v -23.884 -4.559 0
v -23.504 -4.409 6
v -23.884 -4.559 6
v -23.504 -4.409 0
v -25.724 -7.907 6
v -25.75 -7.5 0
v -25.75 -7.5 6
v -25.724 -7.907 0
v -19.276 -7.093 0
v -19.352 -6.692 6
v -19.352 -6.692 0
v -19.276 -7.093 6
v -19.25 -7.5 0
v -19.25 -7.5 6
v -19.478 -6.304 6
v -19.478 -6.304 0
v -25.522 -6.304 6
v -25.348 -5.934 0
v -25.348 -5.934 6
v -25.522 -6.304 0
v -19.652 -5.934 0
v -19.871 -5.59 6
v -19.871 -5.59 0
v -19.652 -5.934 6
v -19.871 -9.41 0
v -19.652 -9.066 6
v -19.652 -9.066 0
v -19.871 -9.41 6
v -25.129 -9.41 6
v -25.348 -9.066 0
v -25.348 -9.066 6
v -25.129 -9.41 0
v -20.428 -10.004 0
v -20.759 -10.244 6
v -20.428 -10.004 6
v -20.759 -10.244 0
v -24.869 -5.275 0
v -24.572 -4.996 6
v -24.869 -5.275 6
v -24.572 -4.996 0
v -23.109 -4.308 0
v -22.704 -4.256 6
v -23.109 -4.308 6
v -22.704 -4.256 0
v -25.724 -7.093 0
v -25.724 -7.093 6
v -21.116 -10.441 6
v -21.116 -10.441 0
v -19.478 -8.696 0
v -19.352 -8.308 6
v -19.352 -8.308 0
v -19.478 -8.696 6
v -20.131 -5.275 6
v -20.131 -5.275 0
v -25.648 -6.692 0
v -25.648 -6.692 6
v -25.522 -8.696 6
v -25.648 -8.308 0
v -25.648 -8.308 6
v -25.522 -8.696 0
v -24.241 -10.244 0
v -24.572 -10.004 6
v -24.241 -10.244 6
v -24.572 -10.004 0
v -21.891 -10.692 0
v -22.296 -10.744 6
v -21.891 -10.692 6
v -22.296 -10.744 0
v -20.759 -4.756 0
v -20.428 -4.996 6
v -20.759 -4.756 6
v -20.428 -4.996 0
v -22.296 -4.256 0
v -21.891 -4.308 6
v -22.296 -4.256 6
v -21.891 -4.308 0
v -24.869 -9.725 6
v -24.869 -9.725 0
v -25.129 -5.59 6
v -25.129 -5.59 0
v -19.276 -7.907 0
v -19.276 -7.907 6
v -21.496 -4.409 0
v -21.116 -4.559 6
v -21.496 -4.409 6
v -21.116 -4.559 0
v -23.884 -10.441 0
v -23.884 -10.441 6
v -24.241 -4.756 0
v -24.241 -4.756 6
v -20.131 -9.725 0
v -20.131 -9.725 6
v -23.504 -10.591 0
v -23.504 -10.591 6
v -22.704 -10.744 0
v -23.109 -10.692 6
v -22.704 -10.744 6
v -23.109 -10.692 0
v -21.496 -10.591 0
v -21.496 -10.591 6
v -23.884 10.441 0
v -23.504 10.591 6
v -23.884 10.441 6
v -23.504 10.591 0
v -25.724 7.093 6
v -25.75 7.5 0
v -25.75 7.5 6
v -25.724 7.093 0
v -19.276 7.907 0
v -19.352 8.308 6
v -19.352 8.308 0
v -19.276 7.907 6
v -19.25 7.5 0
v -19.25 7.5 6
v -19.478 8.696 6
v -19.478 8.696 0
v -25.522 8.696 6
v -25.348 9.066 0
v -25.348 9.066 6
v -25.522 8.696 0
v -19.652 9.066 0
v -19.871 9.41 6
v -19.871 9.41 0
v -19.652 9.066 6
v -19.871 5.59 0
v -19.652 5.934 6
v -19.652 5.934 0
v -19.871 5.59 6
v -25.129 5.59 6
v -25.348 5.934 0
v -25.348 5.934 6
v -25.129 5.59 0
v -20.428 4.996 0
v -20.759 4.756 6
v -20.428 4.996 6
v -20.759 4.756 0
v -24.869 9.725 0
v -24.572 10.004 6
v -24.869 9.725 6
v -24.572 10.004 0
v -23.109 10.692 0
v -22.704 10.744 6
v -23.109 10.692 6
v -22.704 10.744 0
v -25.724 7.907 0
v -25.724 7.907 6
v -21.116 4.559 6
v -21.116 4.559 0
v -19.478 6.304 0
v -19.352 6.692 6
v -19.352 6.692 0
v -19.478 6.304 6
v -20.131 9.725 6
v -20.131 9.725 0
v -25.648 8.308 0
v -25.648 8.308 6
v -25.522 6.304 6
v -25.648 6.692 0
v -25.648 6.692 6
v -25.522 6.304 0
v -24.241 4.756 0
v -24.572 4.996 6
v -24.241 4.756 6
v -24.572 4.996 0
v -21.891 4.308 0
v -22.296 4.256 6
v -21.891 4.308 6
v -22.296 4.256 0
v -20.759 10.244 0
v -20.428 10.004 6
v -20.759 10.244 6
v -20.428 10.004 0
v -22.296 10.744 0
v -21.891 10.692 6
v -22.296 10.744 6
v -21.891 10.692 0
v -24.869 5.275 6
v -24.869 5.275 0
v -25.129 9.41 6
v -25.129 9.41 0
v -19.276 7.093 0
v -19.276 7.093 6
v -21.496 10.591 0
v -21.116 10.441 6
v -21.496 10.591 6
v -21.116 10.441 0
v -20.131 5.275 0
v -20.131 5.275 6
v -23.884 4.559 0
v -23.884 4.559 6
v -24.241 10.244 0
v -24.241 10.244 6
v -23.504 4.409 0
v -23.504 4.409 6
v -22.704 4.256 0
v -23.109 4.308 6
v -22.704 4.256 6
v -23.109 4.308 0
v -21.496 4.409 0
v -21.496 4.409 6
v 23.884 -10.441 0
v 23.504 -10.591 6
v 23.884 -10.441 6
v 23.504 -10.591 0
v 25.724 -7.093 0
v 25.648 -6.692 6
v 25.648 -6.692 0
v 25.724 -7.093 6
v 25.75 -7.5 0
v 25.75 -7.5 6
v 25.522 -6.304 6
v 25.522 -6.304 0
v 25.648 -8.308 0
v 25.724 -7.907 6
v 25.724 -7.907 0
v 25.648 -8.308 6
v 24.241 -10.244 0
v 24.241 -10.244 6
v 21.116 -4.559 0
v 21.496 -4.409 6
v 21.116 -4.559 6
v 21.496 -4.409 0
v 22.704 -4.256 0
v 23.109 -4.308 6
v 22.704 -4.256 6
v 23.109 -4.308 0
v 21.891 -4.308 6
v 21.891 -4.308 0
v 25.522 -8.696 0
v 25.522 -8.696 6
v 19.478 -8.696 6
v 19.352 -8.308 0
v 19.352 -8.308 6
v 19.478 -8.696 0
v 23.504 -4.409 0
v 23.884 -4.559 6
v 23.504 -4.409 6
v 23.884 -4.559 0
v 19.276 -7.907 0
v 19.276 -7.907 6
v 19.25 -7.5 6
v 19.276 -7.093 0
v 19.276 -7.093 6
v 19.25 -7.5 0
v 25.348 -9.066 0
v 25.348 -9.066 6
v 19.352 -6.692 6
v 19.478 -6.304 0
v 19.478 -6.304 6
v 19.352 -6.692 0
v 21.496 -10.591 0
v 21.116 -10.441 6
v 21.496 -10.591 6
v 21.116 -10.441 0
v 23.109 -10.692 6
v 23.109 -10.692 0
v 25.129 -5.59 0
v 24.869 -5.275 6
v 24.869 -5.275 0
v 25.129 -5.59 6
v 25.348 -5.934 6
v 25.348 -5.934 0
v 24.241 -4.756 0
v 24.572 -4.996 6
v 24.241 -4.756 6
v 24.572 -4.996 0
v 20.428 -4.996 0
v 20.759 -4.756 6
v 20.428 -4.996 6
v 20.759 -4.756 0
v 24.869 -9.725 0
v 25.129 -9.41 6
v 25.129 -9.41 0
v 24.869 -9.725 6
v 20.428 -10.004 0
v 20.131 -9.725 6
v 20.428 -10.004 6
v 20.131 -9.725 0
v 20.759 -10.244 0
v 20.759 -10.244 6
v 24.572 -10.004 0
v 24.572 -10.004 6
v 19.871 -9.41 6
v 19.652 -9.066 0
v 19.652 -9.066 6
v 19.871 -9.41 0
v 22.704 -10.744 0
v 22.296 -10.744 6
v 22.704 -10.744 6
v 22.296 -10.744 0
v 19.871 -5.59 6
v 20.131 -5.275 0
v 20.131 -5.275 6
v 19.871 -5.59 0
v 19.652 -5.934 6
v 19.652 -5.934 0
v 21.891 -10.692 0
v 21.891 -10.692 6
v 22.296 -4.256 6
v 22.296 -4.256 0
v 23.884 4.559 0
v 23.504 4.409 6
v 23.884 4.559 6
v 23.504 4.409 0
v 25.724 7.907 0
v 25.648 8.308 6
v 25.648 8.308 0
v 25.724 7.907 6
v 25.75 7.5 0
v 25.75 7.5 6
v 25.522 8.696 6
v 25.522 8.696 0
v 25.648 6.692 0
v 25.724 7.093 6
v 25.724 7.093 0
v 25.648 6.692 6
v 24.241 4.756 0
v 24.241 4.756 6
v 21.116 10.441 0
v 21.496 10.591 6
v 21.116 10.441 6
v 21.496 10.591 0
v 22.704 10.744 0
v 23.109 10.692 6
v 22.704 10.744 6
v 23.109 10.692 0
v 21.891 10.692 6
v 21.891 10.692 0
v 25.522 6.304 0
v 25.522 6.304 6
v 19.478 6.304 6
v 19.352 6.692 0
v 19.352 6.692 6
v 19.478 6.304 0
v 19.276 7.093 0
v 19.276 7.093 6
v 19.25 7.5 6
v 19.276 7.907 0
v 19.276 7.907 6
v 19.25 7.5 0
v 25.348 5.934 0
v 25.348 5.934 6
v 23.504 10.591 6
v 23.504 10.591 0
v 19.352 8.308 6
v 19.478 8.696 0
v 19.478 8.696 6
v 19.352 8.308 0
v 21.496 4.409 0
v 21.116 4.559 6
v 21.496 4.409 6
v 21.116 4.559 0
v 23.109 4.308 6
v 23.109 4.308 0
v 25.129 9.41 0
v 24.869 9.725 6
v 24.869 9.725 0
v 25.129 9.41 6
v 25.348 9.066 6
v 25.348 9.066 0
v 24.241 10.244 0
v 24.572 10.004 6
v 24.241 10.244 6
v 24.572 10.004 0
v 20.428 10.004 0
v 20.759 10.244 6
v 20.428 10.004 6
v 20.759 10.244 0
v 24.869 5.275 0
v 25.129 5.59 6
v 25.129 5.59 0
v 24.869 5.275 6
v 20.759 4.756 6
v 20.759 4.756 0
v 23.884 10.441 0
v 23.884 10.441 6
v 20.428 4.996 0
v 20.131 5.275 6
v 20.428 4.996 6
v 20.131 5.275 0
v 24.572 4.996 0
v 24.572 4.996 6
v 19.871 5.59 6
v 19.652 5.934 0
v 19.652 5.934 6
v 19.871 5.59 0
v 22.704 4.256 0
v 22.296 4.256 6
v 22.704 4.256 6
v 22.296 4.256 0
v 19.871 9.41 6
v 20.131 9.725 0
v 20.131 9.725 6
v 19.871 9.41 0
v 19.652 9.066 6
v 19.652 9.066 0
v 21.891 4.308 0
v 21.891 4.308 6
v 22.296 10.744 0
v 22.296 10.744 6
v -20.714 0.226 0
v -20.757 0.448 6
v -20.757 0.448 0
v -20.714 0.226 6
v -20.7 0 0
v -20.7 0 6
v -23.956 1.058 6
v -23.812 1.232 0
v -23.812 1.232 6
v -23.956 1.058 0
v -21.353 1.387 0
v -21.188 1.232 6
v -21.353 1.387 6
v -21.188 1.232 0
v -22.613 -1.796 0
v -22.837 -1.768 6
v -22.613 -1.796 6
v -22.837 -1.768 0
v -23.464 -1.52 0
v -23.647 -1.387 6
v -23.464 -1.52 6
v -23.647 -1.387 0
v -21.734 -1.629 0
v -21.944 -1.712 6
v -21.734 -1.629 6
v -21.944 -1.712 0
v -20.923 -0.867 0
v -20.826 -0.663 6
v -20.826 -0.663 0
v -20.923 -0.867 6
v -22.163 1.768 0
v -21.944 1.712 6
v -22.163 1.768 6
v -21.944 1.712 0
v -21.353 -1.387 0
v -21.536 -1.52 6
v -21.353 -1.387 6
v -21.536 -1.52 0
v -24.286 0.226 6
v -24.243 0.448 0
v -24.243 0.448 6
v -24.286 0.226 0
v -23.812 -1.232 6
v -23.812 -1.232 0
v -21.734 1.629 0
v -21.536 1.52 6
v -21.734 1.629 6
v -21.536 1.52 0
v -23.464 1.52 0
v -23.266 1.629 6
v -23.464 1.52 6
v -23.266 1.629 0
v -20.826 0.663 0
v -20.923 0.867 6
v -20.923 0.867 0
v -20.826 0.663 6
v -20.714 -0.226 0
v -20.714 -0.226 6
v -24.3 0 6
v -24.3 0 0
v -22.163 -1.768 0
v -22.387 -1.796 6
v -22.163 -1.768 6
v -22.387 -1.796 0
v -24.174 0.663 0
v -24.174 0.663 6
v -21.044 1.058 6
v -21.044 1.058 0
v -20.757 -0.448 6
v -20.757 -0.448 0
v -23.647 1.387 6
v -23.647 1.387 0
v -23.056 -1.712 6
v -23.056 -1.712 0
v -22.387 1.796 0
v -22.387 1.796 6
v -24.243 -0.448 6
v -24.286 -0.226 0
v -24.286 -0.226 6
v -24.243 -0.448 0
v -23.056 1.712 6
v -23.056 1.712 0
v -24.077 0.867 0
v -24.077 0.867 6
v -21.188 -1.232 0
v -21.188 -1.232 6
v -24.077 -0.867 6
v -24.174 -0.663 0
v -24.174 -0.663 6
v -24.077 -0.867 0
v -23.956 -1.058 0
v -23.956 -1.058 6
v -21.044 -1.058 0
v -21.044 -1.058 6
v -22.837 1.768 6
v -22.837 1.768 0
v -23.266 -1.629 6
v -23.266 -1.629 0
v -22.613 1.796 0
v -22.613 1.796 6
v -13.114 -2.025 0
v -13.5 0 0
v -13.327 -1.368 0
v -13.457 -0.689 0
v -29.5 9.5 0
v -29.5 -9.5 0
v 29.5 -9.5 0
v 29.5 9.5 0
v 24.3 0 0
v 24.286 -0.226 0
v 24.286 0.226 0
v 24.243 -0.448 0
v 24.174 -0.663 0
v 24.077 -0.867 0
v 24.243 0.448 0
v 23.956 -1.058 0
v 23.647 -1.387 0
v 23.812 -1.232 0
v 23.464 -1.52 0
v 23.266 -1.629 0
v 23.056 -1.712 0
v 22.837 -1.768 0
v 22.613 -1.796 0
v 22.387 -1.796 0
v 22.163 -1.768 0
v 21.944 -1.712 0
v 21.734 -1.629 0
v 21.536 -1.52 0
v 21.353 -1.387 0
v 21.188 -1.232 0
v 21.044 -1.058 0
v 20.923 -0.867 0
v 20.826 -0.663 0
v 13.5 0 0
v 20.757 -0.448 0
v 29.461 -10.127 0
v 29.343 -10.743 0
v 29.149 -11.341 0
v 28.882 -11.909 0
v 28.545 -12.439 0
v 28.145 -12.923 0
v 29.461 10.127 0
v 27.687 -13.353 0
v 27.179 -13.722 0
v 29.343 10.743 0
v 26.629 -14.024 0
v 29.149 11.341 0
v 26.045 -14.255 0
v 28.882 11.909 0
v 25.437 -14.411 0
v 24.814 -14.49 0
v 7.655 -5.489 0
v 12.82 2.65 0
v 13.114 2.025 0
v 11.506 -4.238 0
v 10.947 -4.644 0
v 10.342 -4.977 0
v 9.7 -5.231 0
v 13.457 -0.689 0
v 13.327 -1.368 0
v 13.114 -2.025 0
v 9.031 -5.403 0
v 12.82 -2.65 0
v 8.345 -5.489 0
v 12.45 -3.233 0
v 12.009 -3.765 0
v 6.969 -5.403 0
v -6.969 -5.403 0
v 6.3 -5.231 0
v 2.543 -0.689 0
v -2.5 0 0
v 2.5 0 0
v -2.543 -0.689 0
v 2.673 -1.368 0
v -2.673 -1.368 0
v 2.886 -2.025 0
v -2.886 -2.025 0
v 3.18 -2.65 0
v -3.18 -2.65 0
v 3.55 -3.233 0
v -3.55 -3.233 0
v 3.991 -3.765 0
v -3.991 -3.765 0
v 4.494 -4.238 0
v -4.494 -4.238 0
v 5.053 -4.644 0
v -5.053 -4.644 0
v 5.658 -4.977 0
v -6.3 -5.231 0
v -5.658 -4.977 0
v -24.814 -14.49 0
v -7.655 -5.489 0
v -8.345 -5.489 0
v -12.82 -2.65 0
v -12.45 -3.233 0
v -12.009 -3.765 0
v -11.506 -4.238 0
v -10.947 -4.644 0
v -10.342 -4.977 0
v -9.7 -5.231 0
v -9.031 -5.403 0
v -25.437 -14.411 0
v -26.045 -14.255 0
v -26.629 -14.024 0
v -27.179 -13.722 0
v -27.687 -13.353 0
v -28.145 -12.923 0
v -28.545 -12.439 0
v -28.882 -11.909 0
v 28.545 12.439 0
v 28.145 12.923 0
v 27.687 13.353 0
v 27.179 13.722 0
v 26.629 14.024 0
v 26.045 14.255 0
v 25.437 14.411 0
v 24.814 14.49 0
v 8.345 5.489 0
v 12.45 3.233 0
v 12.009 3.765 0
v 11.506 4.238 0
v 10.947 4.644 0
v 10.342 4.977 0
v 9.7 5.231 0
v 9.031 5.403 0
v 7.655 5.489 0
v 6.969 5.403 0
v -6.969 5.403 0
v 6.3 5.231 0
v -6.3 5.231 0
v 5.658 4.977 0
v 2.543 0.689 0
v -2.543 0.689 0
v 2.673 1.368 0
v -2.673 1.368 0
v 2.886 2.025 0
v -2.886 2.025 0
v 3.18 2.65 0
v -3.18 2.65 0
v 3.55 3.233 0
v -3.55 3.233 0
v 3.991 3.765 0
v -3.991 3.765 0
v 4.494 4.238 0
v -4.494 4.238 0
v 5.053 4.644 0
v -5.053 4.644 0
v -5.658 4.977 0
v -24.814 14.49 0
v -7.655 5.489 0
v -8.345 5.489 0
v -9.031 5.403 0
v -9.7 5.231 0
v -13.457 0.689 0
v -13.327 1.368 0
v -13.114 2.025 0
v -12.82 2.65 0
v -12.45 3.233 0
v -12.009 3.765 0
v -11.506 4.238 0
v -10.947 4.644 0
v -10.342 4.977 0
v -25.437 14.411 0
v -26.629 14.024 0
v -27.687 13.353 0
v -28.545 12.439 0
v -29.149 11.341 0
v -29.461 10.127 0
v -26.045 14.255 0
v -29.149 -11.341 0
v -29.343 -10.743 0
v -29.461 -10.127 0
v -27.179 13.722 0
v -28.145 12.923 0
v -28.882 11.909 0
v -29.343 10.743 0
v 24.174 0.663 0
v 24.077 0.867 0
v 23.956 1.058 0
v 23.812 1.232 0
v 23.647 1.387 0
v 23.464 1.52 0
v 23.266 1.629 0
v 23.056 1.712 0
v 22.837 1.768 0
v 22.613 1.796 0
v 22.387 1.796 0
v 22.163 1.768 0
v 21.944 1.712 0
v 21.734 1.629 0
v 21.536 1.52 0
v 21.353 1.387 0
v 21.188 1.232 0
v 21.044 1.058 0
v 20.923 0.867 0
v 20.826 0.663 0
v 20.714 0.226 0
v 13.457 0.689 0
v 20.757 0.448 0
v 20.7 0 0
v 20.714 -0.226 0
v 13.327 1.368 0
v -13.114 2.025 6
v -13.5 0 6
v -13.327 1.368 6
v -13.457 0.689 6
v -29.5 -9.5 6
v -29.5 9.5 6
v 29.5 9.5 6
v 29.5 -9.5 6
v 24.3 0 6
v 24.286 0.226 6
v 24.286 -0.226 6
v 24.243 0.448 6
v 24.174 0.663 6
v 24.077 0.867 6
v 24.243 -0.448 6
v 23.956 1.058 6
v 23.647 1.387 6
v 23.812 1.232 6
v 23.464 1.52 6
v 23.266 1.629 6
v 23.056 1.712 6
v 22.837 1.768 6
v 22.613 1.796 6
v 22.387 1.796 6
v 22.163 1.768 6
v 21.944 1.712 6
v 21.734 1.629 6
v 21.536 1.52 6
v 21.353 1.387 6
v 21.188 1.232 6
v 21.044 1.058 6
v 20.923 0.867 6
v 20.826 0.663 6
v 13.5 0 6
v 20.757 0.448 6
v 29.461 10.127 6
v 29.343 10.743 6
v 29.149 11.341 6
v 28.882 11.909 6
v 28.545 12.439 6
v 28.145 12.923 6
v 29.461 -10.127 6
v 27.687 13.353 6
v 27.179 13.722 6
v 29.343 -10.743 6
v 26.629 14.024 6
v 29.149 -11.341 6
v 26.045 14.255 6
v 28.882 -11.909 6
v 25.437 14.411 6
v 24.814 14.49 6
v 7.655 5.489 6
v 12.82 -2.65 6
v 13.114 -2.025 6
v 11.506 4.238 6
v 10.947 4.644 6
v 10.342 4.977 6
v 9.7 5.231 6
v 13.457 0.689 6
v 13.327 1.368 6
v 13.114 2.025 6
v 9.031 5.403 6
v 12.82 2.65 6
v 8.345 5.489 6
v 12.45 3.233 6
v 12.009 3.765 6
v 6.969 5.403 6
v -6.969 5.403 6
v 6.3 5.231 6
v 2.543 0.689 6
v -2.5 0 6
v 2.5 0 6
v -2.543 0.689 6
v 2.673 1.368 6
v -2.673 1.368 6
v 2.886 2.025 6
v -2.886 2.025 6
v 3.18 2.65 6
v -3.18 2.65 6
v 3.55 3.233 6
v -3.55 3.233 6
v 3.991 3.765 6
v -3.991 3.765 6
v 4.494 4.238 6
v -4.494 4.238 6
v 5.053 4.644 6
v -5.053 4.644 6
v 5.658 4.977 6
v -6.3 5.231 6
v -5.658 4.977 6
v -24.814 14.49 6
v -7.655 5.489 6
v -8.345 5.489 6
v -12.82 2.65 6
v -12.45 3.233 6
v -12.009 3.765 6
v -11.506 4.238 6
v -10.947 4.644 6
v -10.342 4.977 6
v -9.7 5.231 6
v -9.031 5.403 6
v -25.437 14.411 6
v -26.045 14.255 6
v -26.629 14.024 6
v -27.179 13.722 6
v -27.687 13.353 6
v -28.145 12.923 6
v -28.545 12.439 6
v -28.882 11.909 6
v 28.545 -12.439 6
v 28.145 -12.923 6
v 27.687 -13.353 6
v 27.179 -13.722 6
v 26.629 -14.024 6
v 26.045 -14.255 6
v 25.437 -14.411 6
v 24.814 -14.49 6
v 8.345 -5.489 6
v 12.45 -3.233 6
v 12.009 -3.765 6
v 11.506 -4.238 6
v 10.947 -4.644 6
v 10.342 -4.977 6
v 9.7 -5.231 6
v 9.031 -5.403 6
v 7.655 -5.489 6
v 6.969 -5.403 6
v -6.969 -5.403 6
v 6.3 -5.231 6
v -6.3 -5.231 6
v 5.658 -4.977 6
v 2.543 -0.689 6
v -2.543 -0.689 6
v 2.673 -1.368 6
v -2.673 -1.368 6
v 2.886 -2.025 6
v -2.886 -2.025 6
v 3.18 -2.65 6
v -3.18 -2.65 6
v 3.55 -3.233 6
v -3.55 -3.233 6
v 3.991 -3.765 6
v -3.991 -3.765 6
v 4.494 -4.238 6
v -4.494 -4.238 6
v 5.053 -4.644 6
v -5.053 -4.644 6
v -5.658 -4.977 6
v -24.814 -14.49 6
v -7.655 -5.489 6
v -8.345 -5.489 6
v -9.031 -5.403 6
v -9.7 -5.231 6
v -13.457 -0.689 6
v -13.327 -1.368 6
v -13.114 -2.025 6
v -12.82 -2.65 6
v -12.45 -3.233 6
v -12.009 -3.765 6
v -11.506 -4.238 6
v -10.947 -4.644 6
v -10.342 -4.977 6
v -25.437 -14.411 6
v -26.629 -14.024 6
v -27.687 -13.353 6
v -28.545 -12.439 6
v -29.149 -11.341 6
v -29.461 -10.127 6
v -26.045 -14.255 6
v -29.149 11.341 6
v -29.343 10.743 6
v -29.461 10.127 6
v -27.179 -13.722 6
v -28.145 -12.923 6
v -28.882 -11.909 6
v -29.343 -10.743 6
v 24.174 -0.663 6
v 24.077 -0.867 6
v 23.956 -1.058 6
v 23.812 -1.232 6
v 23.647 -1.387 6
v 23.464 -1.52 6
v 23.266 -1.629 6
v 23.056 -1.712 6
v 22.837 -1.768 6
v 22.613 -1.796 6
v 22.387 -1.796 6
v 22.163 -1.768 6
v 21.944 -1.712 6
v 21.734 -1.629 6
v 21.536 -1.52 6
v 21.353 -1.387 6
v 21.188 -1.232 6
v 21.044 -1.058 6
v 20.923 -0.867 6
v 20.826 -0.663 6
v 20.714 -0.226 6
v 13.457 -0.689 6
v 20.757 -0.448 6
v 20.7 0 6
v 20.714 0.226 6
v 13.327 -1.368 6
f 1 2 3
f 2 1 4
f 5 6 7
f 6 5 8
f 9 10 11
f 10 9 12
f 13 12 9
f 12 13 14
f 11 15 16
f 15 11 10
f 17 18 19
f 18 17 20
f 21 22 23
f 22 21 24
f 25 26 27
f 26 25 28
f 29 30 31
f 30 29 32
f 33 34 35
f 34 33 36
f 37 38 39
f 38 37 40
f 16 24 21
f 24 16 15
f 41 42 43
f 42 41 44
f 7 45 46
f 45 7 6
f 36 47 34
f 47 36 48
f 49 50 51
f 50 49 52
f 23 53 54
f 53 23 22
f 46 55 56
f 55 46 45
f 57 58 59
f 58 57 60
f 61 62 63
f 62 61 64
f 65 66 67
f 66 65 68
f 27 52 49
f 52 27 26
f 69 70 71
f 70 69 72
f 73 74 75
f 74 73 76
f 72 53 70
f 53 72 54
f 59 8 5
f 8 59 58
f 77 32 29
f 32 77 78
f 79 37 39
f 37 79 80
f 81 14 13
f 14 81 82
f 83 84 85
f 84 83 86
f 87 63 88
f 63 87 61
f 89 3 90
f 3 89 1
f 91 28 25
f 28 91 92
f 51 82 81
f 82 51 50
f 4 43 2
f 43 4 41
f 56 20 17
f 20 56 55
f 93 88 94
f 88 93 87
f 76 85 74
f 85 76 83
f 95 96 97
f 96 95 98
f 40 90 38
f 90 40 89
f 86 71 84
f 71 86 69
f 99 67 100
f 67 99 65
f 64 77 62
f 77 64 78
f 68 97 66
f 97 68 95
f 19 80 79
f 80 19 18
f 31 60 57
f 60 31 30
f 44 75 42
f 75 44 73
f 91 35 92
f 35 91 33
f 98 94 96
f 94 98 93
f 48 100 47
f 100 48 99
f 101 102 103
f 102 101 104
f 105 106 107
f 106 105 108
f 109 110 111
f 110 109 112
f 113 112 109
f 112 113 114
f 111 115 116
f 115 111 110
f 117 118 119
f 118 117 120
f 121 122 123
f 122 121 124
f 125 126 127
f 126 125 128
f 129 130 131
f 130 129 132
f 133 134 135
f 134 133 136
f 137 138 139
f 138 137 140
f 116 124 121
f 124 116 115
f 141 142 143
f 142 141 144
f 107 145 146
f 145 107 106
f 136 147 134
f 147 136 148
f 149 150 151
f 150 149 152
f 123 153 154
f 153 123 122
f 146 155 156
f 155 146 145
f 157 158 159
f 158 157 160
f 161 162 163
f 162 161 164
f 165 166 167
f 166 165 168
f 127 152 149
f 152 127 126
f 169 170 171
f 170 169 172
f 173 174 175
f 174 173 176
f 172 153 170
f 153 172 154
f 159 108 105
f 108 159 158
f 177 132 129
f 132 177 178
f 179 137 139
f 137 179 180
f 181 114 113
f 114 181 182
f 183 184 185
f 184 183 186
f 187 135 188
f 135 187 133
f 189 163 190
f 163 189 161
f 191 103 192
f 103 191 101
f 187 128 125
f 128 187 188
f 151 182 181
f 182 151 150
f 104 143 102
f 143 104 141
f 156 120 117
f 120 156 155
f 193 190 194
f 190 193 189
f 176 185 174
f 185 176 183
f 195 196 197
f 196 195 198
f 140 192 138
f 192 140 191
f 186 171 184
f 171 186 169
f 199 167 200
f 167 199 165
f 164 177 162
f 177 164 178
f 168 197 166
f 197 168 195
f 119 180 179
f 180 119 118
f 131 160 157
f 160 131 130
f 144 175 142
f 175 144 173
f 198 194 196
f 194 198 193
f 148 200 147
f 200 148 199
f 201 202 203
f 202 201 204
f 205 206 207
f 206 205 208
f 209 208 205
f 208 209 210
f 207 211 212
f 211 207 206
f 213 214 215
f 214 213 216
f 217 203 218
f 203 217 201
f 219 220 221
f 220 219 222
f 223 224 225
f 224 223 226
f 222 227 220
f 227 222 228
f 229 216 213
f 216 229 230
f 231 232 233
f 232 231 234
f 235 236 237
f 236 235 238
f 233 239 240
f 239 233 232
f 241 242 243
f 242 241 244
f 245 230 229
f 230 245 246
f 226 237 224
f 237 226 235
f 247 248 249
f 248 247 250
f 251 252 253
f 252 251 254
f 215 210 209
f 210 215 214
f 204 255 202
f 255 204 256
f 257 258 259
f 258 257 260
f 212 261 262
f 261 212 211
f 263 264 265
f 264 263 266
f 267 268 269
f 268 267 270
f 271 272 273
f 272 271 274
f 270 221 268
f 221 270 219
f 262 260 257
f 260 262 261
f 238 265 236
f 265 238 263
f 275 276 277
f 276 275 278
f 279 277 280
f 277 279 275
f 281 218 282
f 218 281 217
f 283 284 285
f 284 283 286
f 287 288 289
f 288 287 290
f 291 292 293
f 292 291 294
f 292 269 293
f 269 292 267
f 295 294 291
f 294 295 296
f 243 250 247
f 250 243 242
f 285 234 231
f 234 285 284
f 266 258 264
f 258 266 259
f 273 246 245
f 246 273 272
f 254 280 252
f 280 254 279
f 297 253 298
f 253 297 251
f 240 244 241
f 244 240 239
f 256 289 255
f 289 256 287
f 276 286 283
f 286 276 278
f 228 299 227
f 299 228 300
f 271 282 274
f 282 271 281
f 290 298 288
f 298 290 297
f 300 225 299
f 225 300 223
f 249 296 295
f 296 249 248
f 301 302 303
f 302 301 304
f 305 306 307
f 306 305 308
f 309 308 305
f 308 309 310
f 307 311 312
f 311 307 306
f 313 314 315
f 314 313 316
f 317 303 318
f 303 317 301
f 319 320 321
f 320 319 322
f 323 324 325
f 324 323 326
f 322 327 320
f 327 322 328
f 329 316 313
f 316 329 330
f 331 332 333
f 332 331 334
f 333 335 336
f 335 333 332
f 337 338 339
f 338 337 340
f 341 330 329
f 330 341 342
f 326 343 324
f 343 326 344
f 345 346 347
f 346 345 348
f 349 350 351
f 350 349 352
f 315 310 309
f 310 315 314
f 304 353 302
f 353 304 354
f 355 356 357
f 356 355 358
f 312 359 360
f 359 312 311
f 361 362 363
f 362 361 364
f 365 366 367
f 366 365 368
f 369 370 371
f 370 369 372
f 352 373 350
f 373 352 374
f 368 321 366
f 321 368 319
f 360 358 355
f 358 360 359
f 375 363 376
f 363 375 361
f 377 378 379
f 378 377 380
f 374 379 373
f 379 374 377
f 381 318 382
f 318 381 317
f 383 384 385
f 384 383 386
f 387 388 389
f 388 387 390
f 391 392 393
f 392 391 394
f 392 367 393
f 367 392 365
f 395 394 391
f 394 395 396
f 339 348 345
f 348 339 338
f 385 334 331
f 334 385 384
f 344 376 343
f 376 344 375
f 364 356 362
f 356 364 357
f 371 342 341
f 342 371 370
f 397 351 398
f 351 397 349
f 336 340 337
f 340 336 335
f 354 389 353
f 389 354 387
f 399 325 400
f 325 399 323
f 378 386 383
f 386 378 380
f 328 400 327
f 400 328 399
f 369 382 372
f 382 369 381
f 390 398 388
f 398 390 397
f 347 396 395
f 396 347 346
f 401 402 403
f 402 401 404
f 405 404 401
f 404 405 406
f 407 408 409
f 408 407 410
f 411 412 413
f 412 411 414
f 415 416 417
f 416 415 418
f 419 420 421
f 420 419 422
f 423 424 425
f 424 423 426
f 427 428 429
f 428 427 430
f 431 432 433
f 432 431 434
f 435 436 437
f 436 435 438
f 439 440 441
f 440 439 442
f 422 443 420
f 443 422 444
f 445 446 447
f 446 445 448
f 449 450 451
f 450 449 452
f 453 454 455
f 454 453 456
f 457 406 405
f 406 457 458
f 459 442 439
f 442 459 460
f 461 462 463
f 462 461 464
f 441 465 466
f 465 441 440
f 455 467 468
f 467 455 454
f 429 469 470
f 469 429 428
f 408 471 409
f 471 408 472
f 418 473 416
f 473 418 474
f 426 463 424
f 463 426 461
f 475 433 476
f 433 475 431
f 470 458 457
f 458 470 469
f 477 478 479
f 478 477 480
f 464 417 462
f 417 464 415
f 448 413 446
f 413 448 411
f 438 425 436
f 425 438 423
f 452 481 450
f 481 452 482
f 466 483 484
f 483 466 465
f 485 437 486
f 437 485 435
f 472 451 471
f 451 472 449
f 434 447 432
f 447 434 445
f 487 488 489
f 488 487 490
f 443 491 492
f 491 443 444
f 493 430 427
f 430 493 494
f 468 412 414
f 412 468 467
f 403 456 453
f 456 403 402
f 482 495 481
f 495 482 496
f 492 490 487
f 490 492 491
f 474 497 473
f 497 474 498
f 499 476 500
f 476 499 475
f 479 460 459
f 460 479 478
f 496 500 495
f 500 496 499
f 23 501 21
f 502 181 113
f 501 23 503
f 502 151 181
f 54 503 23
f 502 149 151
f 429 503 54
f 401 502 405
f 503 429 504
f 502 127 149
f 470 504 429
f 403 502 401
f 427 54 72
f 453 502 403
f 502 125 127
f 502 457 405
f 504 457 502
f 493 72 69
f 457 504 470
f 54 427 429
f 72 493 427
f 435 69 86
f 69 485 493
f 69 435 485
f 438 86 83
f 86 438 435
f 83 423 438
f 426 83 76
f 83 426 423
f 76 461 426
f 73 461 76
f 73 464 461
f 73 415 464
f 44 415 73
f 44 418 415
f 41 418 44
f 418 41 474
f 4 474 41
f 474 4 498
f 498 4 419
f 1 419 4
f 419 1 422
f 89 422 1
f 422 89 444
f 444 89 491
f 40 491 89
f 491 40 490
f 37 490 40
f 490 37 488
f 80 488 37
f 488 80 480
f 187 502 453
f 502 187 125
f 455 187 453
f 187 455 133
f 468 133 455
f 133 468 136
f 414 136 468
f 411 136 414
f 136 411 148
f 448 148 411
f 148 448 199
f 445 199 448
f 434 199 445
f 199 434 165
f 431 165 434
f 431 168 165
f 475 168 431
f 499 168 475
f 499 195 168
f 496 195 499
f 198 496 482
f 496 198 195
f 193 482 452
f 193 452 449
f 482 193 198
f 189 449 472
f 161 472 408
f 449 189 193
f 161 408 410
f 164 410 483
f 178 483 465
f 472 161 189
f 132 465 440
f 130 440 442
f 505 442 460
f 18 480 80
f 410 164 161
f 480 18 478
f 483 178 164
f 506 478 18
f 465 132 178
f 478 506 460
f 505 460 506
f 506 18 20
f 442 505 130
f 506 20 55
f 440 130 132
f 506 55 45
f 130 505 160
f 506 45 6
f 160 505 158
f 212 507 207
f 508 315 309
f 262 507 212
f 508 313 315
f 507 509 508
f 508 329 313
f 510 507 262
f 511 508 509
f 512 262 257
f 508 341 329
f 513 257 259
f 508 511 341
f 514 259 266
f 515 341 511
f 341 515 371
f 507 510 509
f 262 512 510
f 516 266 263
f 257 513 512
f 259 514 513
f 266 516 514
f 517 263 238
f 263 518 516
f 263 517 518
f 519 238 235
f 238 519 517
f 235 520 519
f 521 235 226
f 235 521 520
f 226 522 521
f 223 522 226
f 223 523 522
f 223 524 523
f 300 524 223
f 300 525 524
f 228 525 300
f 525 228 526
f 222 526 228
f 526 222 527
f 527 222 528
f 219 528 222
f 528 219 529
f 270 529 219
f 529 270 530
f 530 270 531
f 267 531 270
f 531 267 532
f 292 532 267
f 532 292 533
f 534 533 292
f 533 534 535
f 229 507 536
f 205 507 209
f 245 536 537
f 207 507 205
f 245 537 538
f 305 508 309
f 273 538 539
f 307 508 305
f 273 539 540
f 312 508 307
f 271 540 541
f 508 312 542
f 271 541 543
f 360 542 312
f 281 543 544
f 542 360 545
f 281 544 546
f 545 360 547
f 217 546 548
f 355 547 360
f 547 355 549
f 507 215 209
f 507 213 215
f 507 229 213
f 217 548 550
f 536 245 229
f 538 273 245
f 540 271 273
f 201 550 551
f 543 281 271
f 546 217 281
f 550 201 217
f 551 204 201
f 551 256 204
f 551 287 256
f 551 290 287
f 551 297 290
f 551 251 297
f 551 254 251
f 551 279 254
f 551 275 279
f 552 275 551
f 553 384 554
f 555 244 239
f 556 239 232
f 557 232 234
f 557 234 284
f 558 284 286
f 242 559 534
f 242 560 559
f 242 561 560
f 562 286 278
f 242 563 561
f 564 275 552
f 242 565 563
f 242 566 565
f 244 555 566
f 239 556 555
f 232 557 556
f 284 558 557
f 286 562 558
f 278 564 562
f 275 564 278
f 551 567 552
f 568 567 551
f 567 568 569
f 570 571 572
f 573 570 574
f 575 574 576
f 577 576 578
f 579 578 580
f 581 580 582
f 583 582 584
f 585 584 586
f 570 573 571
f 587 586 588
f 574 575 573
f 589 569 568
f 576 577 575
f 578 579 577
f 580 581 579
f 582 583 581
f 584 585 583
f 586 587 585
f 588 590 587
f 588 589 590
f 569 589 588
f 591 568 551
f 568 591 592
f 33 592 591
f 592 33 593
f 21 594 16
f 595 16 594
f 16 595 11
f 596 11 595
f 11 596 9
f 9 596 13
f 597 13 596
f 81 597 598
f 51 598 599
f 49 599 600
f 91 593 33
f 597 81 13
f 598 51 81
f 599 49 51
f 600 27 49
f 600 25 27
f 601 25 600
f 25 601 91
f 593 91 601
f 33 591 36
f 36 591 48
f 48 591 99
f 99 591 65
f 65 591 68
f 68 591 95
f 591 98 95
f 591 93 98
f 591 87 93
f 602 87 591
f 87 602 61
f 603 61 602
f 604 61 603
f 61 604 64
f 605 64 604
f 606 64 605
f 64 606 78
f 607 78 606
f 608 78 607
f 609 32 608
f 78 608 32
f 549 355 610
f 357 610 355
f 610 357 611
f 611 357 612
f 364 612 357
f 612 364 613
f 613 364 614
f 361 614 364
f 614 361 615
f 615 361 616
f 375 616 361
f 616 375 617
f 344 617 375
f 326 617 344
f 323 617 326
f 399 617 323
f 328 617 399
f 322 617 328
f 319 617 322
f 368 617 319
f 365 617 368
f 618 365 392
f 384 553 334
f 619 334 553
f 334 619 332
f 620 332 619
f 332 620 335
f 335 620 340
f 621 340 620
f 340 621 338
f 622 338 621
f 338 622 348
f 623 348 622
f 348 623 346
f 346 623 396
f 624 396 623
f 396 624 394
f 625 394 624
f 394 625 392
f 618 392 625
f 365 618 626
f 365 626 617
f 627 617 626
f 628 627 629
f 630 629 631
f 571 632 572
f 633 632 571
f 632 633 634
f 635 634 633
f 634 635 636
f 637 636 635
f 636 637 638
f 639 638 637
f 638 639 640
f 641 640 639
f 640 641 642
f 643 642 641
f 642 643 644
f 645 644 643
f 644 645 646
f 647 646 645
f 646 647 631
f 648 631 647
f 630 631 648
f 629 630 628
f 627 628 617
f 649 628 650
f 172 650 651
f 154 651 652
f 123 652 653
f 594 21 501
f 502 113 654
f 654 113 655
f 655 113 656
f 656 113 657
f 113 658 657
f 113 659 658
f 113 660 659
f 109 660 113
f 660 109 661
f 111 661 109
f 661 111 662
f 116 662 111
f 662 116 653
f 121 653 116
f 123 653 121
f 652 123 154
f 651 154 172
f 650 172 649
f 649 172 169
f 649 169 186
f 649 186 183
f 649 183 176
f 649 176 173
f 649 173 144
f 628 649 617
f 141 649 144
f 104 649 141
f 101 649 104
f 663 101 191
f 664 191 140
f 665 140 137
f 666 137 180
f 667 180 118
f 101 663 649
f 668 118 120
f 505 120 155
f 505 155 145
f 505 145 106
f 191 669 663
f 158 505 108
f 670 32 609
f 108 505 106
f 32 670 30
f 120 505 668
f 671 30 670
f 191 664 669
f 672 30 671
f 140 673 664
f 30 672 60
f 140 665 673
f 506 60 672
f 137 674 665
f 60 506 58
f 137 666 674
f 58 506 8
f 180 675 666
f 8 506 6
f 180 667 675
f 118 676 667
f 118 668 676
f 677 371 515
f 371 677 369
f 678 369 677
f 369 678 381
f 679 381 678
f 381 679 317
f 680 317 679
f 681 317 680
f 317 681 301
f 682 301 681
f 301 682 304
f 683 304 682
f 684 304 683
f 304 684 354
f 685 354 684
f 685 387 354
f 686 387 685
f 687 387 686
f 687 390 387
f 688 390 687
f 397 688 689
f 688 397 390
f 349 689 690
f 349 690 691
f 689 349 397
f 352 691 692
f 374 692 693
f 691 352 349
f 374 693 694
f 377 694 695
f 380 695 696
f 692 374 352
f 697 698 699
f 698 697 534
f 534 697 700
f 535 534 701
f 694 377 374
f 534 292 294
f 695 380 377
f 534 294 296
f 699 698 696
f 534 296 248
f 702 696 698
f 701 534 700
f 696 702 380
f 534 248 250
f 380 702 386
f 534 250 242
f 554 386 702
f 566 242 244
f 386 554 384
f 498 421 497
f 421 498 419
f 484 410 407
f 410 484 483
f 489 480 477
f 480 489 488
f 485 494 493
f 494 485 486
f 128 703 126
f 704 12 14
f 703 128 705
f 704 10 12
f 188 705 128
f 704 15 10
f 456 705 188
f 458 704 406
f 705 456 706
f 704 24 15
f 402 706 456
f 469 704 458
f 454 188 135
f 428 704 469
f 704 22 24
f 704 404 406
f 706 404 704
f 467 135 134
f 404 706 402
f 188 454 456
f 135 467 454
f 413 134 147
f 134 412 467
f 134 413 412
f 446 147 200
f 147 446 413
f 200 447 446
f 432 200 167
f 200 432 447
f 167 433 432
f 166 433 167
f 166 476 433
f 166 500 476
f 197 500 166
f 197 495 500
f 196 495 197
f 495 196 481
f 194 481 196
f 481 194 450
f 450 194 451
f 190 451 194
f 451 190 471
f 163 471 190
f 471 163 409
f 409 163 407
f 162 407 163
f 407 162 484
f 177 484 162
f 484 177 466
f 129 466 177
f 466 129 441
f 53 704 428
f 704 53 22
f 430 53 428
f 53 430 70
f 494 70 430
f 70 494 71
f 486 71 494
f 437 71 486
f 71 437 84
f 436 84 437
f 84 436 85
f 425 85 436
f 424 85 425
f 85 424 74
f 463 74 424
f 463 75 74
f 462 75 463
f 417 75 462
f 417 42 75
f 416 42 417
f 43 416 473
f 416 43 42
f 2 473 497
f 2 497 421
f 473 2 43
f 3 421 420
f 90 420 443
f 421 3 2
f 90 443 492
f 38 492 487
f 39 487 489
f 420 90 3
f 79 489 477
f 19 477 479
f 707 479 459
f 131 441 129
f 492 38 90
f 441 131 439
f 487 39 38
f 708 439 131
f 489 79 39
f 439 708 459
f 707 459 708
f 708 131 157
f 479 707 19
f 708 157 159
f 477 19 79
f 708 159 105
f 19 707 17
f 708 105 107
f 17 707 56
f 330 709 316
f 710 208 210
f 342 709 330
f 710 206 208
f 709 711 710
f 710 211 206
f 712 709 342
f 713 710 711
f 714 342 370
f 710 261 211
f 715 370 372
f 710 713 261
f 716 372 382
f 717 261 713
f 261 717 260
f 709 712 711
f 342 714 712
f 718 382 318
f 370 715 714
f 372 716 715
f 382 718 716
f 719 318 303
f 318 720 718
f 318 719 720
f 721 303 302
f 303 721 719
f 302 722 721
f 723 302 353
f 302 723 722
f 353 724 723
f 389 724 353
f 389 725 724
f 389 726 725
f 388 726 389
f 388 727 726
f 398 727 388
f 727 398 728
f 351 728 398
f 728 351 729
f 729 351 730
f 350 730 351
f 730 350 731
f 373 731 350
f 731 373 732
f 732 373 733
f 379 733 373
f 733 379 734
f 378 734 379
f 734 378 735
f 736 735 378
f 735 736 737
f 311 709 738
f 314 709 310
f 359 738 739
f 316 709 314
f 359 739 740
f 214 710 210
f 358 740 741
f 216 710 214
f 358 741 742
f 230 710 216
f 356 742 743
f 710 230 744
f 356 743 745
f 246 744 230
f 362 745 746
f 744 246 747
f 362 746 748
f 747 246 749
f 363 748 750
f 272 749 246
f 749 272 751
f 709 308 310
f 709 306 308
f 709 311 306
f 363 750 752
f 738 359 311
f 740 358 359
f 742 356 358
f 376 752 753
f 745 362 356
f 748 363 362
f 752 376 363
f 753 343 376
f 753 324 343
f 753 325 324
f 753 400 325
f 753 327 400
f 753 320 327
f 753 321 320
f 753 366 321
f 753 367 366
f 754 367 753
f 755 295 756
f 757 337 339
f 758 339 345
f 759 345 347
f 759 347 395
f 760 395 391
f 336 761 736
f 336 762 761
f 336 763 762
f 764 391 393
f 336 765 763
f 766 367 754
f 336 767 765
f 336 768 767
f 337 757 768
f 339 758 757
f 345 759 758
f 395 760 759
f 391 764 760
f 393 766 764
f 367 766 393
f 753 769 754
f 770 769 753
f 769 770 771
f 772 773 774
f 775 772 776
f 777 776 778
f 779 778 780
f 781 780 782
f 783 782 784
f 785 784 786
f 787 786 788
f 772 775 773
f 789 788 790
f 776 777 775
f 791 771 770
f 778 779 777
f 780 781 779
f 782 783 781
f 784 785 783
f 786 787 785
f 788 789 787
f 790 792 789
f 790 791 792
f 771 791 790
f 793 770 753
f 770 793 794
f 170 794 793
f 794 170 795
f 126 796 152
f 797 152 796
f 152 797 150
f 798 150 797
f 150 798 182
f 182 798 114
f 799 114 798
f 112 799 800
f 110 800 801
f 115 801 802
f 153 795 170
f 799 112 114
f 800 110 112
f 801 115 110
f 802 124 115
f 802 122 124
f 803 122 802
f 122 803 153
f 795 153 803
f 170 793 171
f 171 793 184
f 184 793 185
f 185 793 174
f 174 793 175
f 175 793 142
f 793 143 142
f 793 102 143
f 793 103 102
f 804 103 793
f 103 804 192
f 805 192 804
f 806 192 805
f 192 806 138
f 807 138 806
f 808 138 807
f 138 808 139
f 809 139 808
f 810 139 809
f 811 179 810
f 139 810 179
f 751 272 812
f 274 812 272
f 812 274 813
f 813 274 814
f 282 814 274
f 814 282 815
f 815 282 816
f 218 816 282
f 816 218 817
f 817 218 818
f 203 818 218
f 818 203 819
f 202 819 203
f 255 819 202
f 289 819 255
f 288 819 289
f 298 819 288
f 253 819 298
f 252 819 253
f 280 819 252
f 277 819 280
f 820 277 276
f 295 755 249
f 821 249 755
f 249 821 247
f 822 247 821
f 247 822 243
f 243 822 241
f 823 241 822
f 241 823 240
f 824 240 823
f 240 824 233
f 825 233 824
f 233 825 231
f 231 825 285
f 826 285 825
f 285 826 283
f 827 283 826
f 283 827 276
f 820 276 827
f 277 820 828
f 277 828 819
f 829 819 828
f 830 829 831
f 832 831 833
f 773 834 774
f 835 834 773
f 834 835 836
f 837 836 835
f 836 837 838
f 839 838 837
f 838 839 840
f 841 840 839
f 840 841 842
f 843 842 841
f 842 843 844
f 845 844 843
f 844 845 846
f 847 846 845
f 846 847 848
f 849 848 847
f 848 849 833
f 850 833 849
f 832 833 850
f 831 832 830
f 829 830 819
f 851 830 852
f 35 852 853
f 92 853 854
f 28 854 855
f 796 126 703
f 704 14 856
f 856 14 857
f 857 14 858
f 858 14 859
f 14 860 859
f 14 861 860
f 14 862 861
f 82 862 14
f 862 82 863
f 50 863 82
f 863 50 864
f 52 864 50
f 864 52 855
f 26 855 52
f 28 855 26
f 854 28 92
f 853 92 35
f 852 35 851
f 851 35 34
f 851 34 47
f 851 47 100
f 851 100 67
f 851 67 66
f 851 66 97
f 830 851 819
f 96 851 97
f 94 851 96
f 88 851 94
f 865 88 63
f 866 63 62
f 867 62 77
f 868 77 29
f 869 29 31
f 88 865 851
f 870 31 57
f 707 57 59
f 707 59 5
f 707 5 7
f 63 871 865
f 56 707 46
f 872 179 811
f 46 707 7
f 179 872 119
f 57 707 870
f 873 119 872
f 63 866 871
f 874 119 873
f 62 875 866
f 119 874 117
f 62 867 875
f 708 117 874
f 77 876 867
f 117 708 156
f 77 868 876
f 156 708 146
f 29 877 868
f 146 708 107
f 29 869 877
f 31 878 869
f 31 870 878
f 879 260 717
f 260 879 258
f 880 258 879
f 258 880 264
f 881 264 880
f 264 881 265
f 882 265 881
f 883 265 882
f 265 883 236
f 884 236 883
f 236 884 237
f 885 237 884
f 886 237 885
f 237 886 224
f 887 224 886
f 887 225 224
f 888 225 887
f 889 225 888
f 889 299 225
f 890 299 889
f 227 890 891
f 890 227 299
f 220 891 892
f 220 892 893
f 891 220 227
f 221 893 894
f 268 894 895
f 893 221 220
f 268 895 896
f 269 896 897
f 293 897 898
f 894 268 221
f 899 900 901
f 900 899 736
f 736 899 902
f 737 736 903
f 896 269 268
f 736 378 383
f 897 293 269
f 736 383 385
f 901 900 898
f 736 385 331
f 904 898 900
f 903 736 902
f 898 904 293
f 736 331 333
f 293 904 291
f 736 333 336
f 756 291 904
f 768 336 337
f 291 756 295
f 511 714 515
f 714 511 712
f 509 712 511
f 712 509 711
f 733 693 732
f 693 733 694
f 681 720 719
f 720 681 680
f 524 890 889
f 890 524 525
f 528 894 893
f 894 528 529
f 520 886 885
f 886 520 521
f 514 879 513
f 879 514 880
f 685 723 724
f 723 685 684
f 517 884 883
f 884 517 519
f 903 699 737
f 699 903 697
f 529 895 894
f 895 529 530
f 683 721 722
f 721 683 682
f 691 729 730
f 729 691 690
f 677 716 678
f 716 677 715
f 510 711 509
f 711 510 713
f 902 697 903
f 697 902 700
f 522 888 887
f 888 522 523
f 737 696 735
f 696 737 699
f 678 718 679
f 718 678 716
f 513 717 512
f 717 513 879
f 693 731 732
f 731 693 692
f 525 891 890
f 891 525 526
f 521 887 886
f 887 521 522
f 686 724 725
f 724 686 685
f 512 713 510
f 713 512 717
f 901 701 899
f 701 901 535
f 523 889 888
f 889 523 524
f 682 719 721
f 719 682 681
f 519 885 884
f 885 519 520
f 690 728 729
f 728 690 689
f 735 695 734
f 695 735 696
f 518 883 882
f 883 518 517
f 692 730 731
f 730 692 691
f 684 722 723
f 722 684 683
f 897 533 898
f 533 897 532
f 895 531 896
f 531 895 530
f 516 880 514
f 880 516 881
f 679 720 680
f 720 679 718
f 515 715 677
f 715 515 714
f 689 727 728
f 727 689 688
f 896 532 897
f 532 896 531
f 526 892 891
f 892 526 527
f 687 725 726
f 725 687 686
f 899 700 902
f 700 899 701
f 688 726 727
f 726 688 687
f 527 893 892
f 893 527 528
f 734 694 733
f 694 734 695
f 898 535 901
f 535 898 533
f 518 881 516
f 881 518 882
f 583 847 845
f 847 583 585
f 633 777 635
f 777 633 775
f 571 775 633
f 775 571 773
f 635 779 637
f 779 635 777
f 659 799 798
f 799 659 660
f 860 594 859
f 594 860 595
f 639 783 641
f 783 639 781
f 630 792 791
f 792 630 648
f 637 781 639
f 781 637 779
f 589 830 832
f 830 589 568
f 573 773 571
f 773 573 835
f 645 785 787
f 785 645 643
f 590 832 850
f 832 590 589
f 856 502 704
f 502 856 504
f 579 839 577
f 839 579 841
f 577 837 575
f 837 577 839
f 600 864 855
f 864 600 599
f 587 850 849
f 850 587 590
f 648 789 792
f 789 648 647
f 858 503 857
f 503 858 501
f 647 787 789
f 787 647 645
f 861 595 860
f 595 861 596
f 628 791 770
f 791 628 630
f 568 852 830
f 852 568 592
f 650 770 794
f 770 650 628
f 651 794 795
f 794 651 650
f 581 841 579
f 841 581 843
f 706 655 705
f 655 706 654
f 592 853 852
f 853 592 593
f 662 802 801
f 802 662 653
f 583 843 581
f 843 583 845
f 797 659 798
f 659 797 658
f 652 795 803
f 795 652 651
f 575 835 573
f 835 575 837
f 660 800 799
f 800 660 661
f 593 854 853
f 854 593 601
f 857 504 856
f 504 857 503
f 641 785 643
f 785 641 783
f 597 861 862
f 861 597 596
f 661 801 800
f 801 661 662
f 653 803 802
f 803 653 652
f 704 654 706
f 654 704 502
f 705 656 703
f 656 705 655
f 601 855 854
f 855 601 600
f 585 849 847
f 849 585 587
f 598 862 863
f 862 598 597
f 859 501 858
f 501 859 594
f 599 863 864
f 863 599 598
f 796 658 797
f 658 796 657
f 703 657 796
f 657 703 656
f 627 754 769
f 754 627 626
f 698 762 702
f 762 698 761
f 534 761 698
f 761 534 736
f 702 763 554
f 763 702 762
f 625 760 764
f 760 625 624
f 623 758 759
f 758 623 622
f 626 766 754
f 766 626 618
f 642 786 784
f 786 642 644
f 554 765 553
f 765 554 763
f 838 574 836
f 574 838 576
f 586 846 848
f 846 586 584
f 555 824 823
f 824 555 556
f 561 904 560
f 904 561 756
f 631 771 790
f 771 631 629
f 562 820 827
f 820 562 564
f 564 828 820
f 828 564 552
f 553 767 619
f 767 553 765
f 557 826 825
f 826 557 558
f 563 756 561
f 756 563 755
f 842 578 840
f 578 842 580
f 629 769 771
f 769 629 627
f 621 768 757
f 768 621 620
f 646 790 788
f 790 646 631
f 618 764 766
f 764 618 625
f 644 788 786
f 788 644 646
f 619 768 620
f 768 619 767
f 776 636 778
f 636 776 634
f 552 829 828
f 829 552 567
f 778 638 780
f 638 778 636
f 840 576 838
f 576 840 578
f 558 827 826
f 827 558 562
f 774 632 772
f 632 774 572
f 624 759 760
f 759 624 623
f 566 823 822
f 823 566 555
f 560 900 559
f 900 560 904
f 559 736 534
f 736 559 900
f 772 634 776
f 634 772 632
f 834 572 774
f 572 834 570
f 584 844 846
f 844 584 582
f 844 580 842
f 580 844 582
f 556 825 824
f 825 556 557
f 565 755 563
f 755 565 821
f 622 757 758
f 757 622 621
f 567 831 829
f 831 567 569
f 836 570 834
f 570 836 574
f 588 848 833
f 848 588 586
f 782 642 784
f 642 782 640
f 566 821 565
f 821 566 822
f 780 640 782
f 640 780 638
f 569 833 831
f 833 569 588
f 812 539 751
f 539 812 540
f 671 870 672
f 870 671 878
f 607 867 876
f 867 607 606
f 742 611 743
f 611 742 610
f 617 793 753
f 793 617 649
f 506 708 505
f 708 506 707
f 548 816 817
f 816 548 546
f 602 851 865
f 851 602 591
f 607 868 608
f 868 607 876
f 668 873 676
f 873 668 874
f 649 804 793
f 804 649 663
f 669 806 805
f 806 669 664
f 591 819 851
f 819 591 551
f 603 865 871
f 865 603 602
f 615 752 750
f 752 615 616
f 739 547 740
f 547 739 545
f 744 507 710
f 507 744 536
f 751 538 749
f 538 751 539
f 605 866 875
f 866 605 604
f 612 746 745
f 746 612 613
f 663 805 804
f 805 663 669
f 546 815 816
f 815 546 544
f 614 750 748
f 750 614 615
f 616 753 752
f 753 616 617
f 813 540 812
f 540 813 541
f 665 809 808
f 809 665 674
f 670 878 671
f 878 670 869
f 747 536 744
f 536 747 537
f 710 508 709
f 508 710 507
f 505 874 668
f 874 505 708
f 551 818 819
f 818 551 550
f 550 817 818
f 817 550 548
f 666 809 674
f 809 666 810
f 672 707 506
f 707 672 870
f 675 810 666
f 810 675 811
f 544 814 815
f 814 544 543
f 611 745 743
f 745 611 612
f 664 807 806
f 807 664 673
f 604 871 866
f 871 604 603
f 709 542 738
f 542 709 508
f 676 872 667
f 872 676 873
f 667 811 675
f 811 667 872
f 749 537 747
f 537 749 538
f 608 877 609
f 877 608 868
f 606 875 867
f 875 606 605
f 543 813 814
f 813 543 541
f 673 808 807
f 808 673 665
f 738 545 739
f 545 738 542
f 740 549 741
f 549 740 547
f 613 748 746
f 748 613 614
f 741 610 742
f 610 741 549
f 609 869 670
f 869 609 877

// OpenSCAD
$fn = 50;


difference() {
	union() {
		hull() {
			translate(v = [-24.5000000000, 9.5000000000, 0]) {
				cylinder(h = 6, r = 5);
			}
			translate(v = [24.5000000000, 9.5000000000, 0]) {
				cylinder(h = 6, r = 5);
			}
			translate(v = [-24.5000000000, -9.5000000000, 0]) {
				cylinder(h = 6, r = 5);
			}
			translate(v = [24.5000000000, -9.5000000000, 0]) {
				cylinder(h = 6, r = 5);
			}
		}
	}
	union() {
		#translate(v = [-22.5000000000, -7.5000000000, 0]) {
			cylinder(h = 6, r = 3.2500000000);
		}
		#translate(v = [-22.5000000000, 7.5000000000, 0]) {
			cylinder(h = 6, r = 3.2500000000);
		}
		#translate(v = [22.5000000000, -7.5000000000, 0]) {
			cylinder(h = 6, r = 3.2500000000);
		}
		#translate(v = [22.5000000000, 7.5000000000, 0]) {
			cylinder(h = 6, r = 3.2500000000);
		}
		#translate(v = [-22.5000000000, -7.5000000000, -100.0000000000]) {
			cylinder(h = 200, r = 3.2500000000);
		}
		#translate(v = [-22.5000000000, 7.5000000000, -100.0000000000]) {
			cylinder(h = 200, r = 3.2500000000);
		}
		#translate(v = [22.5000000000, -7.5000000000, -100.0000000000]) {
			cylinder(h = 200, r = 3.2500000000);
		}
		#translate(v = [22.5000000000, 7.5000000000, -100.0000000000]) {
			cylinder(h = 200, r = 3.2500000000);
		}
		#translate(v = [-22.5000000000, -7.5000000000, 0]) {
			cylinder(h = 6, r = 1.8000000000);
		}
		#translate(v = [-22.5000000000, 0.0000000000, 0]) {
			cylinder(h = 6, r = 1.8000000000);
		}
		#translate(v = [-22.5000000000, 7.5000000000, 0]) {
			cylinder(h = 6, r = 1.8000000000);
		}
		#translate(v = [22.5000000000, -7.5000000000, 0]) {
			cylinder(h = 6, r = 1.8000000000);
		}
		#translate(v = [22.5000000000, 0.0000000000, 0]) {
			cylinder(h = 6, r = 1.8000000000);
		}
		#translate(v = [22.5000000000, 7.5000000000, 0]) {
			cylinder(h = 6, r = 1.8000000000);
		}
		#translate(v = [-22.5000000000, -7.5000000000, 0]) {
			cylinder(h = 6, r = 1.8000000000);
		}
		#translate(v = [-22.5000000000, 0.0000000000, 0]) {
			cylinder(h = 6, r = 1.8000000000);
		}
		#translate(v = [-22.5000000000, 7.5000000000, 0]) {
			cylinder(h = 6, r = 1.8000000000);
		}
		#translate(v = [22.5000000000, -7.5000000000, 0]) {
			cylinder(h = 6, r = 1.8000000000);
		}
		#translate(v = [22.5000000000, 0.0000000000, 0]) {
			cylinder(h = 6, r = 1.8000000000);
		}
		#translate(v = [22.5000000000, 7.5000000000, 0]) {
			cylinder(h = 6, r = 1.8000000000);
		}
		#translate(v = [-22.5000000000, -7.5000000000, 0]) {
			cylinder(h = 6, r = 1.8000000000);
		}
		#translate(v = [-22.5000000000, 0.0000000000, 0]) {
			cylinder(h = 6, r = 1.8000000000);
		}
		#translate(v = [-22.5000000000, 7.5000000000, 0]) {
			cylinder(h = 6, r = 1.8000000000);
		}
		#translate(v = [22.5000000000, -7.5000000000, 0]) {
			cylinder(h = 6, r = 1.8000000000);
		}
		#translate(v = [22.5000000000, 0.0000000000, 0]) {
			cylinder(h = 6, r = 1.8000000000);
		}
		#translate(v = [22.5000000000, 7.5000000000, 0]) {
			cylinder(h = 6, r = 1.8000000000);
		}
		#translate(v = [-8.0000000000, 0, 0]) {
			cylinder(h = 6, r = 5.5000000000);
		}
		#translate(v = [8.0000000000, 0, 0]) {
			cylinder(h = 6, r = 5.5000000000);
		}
	}
}
